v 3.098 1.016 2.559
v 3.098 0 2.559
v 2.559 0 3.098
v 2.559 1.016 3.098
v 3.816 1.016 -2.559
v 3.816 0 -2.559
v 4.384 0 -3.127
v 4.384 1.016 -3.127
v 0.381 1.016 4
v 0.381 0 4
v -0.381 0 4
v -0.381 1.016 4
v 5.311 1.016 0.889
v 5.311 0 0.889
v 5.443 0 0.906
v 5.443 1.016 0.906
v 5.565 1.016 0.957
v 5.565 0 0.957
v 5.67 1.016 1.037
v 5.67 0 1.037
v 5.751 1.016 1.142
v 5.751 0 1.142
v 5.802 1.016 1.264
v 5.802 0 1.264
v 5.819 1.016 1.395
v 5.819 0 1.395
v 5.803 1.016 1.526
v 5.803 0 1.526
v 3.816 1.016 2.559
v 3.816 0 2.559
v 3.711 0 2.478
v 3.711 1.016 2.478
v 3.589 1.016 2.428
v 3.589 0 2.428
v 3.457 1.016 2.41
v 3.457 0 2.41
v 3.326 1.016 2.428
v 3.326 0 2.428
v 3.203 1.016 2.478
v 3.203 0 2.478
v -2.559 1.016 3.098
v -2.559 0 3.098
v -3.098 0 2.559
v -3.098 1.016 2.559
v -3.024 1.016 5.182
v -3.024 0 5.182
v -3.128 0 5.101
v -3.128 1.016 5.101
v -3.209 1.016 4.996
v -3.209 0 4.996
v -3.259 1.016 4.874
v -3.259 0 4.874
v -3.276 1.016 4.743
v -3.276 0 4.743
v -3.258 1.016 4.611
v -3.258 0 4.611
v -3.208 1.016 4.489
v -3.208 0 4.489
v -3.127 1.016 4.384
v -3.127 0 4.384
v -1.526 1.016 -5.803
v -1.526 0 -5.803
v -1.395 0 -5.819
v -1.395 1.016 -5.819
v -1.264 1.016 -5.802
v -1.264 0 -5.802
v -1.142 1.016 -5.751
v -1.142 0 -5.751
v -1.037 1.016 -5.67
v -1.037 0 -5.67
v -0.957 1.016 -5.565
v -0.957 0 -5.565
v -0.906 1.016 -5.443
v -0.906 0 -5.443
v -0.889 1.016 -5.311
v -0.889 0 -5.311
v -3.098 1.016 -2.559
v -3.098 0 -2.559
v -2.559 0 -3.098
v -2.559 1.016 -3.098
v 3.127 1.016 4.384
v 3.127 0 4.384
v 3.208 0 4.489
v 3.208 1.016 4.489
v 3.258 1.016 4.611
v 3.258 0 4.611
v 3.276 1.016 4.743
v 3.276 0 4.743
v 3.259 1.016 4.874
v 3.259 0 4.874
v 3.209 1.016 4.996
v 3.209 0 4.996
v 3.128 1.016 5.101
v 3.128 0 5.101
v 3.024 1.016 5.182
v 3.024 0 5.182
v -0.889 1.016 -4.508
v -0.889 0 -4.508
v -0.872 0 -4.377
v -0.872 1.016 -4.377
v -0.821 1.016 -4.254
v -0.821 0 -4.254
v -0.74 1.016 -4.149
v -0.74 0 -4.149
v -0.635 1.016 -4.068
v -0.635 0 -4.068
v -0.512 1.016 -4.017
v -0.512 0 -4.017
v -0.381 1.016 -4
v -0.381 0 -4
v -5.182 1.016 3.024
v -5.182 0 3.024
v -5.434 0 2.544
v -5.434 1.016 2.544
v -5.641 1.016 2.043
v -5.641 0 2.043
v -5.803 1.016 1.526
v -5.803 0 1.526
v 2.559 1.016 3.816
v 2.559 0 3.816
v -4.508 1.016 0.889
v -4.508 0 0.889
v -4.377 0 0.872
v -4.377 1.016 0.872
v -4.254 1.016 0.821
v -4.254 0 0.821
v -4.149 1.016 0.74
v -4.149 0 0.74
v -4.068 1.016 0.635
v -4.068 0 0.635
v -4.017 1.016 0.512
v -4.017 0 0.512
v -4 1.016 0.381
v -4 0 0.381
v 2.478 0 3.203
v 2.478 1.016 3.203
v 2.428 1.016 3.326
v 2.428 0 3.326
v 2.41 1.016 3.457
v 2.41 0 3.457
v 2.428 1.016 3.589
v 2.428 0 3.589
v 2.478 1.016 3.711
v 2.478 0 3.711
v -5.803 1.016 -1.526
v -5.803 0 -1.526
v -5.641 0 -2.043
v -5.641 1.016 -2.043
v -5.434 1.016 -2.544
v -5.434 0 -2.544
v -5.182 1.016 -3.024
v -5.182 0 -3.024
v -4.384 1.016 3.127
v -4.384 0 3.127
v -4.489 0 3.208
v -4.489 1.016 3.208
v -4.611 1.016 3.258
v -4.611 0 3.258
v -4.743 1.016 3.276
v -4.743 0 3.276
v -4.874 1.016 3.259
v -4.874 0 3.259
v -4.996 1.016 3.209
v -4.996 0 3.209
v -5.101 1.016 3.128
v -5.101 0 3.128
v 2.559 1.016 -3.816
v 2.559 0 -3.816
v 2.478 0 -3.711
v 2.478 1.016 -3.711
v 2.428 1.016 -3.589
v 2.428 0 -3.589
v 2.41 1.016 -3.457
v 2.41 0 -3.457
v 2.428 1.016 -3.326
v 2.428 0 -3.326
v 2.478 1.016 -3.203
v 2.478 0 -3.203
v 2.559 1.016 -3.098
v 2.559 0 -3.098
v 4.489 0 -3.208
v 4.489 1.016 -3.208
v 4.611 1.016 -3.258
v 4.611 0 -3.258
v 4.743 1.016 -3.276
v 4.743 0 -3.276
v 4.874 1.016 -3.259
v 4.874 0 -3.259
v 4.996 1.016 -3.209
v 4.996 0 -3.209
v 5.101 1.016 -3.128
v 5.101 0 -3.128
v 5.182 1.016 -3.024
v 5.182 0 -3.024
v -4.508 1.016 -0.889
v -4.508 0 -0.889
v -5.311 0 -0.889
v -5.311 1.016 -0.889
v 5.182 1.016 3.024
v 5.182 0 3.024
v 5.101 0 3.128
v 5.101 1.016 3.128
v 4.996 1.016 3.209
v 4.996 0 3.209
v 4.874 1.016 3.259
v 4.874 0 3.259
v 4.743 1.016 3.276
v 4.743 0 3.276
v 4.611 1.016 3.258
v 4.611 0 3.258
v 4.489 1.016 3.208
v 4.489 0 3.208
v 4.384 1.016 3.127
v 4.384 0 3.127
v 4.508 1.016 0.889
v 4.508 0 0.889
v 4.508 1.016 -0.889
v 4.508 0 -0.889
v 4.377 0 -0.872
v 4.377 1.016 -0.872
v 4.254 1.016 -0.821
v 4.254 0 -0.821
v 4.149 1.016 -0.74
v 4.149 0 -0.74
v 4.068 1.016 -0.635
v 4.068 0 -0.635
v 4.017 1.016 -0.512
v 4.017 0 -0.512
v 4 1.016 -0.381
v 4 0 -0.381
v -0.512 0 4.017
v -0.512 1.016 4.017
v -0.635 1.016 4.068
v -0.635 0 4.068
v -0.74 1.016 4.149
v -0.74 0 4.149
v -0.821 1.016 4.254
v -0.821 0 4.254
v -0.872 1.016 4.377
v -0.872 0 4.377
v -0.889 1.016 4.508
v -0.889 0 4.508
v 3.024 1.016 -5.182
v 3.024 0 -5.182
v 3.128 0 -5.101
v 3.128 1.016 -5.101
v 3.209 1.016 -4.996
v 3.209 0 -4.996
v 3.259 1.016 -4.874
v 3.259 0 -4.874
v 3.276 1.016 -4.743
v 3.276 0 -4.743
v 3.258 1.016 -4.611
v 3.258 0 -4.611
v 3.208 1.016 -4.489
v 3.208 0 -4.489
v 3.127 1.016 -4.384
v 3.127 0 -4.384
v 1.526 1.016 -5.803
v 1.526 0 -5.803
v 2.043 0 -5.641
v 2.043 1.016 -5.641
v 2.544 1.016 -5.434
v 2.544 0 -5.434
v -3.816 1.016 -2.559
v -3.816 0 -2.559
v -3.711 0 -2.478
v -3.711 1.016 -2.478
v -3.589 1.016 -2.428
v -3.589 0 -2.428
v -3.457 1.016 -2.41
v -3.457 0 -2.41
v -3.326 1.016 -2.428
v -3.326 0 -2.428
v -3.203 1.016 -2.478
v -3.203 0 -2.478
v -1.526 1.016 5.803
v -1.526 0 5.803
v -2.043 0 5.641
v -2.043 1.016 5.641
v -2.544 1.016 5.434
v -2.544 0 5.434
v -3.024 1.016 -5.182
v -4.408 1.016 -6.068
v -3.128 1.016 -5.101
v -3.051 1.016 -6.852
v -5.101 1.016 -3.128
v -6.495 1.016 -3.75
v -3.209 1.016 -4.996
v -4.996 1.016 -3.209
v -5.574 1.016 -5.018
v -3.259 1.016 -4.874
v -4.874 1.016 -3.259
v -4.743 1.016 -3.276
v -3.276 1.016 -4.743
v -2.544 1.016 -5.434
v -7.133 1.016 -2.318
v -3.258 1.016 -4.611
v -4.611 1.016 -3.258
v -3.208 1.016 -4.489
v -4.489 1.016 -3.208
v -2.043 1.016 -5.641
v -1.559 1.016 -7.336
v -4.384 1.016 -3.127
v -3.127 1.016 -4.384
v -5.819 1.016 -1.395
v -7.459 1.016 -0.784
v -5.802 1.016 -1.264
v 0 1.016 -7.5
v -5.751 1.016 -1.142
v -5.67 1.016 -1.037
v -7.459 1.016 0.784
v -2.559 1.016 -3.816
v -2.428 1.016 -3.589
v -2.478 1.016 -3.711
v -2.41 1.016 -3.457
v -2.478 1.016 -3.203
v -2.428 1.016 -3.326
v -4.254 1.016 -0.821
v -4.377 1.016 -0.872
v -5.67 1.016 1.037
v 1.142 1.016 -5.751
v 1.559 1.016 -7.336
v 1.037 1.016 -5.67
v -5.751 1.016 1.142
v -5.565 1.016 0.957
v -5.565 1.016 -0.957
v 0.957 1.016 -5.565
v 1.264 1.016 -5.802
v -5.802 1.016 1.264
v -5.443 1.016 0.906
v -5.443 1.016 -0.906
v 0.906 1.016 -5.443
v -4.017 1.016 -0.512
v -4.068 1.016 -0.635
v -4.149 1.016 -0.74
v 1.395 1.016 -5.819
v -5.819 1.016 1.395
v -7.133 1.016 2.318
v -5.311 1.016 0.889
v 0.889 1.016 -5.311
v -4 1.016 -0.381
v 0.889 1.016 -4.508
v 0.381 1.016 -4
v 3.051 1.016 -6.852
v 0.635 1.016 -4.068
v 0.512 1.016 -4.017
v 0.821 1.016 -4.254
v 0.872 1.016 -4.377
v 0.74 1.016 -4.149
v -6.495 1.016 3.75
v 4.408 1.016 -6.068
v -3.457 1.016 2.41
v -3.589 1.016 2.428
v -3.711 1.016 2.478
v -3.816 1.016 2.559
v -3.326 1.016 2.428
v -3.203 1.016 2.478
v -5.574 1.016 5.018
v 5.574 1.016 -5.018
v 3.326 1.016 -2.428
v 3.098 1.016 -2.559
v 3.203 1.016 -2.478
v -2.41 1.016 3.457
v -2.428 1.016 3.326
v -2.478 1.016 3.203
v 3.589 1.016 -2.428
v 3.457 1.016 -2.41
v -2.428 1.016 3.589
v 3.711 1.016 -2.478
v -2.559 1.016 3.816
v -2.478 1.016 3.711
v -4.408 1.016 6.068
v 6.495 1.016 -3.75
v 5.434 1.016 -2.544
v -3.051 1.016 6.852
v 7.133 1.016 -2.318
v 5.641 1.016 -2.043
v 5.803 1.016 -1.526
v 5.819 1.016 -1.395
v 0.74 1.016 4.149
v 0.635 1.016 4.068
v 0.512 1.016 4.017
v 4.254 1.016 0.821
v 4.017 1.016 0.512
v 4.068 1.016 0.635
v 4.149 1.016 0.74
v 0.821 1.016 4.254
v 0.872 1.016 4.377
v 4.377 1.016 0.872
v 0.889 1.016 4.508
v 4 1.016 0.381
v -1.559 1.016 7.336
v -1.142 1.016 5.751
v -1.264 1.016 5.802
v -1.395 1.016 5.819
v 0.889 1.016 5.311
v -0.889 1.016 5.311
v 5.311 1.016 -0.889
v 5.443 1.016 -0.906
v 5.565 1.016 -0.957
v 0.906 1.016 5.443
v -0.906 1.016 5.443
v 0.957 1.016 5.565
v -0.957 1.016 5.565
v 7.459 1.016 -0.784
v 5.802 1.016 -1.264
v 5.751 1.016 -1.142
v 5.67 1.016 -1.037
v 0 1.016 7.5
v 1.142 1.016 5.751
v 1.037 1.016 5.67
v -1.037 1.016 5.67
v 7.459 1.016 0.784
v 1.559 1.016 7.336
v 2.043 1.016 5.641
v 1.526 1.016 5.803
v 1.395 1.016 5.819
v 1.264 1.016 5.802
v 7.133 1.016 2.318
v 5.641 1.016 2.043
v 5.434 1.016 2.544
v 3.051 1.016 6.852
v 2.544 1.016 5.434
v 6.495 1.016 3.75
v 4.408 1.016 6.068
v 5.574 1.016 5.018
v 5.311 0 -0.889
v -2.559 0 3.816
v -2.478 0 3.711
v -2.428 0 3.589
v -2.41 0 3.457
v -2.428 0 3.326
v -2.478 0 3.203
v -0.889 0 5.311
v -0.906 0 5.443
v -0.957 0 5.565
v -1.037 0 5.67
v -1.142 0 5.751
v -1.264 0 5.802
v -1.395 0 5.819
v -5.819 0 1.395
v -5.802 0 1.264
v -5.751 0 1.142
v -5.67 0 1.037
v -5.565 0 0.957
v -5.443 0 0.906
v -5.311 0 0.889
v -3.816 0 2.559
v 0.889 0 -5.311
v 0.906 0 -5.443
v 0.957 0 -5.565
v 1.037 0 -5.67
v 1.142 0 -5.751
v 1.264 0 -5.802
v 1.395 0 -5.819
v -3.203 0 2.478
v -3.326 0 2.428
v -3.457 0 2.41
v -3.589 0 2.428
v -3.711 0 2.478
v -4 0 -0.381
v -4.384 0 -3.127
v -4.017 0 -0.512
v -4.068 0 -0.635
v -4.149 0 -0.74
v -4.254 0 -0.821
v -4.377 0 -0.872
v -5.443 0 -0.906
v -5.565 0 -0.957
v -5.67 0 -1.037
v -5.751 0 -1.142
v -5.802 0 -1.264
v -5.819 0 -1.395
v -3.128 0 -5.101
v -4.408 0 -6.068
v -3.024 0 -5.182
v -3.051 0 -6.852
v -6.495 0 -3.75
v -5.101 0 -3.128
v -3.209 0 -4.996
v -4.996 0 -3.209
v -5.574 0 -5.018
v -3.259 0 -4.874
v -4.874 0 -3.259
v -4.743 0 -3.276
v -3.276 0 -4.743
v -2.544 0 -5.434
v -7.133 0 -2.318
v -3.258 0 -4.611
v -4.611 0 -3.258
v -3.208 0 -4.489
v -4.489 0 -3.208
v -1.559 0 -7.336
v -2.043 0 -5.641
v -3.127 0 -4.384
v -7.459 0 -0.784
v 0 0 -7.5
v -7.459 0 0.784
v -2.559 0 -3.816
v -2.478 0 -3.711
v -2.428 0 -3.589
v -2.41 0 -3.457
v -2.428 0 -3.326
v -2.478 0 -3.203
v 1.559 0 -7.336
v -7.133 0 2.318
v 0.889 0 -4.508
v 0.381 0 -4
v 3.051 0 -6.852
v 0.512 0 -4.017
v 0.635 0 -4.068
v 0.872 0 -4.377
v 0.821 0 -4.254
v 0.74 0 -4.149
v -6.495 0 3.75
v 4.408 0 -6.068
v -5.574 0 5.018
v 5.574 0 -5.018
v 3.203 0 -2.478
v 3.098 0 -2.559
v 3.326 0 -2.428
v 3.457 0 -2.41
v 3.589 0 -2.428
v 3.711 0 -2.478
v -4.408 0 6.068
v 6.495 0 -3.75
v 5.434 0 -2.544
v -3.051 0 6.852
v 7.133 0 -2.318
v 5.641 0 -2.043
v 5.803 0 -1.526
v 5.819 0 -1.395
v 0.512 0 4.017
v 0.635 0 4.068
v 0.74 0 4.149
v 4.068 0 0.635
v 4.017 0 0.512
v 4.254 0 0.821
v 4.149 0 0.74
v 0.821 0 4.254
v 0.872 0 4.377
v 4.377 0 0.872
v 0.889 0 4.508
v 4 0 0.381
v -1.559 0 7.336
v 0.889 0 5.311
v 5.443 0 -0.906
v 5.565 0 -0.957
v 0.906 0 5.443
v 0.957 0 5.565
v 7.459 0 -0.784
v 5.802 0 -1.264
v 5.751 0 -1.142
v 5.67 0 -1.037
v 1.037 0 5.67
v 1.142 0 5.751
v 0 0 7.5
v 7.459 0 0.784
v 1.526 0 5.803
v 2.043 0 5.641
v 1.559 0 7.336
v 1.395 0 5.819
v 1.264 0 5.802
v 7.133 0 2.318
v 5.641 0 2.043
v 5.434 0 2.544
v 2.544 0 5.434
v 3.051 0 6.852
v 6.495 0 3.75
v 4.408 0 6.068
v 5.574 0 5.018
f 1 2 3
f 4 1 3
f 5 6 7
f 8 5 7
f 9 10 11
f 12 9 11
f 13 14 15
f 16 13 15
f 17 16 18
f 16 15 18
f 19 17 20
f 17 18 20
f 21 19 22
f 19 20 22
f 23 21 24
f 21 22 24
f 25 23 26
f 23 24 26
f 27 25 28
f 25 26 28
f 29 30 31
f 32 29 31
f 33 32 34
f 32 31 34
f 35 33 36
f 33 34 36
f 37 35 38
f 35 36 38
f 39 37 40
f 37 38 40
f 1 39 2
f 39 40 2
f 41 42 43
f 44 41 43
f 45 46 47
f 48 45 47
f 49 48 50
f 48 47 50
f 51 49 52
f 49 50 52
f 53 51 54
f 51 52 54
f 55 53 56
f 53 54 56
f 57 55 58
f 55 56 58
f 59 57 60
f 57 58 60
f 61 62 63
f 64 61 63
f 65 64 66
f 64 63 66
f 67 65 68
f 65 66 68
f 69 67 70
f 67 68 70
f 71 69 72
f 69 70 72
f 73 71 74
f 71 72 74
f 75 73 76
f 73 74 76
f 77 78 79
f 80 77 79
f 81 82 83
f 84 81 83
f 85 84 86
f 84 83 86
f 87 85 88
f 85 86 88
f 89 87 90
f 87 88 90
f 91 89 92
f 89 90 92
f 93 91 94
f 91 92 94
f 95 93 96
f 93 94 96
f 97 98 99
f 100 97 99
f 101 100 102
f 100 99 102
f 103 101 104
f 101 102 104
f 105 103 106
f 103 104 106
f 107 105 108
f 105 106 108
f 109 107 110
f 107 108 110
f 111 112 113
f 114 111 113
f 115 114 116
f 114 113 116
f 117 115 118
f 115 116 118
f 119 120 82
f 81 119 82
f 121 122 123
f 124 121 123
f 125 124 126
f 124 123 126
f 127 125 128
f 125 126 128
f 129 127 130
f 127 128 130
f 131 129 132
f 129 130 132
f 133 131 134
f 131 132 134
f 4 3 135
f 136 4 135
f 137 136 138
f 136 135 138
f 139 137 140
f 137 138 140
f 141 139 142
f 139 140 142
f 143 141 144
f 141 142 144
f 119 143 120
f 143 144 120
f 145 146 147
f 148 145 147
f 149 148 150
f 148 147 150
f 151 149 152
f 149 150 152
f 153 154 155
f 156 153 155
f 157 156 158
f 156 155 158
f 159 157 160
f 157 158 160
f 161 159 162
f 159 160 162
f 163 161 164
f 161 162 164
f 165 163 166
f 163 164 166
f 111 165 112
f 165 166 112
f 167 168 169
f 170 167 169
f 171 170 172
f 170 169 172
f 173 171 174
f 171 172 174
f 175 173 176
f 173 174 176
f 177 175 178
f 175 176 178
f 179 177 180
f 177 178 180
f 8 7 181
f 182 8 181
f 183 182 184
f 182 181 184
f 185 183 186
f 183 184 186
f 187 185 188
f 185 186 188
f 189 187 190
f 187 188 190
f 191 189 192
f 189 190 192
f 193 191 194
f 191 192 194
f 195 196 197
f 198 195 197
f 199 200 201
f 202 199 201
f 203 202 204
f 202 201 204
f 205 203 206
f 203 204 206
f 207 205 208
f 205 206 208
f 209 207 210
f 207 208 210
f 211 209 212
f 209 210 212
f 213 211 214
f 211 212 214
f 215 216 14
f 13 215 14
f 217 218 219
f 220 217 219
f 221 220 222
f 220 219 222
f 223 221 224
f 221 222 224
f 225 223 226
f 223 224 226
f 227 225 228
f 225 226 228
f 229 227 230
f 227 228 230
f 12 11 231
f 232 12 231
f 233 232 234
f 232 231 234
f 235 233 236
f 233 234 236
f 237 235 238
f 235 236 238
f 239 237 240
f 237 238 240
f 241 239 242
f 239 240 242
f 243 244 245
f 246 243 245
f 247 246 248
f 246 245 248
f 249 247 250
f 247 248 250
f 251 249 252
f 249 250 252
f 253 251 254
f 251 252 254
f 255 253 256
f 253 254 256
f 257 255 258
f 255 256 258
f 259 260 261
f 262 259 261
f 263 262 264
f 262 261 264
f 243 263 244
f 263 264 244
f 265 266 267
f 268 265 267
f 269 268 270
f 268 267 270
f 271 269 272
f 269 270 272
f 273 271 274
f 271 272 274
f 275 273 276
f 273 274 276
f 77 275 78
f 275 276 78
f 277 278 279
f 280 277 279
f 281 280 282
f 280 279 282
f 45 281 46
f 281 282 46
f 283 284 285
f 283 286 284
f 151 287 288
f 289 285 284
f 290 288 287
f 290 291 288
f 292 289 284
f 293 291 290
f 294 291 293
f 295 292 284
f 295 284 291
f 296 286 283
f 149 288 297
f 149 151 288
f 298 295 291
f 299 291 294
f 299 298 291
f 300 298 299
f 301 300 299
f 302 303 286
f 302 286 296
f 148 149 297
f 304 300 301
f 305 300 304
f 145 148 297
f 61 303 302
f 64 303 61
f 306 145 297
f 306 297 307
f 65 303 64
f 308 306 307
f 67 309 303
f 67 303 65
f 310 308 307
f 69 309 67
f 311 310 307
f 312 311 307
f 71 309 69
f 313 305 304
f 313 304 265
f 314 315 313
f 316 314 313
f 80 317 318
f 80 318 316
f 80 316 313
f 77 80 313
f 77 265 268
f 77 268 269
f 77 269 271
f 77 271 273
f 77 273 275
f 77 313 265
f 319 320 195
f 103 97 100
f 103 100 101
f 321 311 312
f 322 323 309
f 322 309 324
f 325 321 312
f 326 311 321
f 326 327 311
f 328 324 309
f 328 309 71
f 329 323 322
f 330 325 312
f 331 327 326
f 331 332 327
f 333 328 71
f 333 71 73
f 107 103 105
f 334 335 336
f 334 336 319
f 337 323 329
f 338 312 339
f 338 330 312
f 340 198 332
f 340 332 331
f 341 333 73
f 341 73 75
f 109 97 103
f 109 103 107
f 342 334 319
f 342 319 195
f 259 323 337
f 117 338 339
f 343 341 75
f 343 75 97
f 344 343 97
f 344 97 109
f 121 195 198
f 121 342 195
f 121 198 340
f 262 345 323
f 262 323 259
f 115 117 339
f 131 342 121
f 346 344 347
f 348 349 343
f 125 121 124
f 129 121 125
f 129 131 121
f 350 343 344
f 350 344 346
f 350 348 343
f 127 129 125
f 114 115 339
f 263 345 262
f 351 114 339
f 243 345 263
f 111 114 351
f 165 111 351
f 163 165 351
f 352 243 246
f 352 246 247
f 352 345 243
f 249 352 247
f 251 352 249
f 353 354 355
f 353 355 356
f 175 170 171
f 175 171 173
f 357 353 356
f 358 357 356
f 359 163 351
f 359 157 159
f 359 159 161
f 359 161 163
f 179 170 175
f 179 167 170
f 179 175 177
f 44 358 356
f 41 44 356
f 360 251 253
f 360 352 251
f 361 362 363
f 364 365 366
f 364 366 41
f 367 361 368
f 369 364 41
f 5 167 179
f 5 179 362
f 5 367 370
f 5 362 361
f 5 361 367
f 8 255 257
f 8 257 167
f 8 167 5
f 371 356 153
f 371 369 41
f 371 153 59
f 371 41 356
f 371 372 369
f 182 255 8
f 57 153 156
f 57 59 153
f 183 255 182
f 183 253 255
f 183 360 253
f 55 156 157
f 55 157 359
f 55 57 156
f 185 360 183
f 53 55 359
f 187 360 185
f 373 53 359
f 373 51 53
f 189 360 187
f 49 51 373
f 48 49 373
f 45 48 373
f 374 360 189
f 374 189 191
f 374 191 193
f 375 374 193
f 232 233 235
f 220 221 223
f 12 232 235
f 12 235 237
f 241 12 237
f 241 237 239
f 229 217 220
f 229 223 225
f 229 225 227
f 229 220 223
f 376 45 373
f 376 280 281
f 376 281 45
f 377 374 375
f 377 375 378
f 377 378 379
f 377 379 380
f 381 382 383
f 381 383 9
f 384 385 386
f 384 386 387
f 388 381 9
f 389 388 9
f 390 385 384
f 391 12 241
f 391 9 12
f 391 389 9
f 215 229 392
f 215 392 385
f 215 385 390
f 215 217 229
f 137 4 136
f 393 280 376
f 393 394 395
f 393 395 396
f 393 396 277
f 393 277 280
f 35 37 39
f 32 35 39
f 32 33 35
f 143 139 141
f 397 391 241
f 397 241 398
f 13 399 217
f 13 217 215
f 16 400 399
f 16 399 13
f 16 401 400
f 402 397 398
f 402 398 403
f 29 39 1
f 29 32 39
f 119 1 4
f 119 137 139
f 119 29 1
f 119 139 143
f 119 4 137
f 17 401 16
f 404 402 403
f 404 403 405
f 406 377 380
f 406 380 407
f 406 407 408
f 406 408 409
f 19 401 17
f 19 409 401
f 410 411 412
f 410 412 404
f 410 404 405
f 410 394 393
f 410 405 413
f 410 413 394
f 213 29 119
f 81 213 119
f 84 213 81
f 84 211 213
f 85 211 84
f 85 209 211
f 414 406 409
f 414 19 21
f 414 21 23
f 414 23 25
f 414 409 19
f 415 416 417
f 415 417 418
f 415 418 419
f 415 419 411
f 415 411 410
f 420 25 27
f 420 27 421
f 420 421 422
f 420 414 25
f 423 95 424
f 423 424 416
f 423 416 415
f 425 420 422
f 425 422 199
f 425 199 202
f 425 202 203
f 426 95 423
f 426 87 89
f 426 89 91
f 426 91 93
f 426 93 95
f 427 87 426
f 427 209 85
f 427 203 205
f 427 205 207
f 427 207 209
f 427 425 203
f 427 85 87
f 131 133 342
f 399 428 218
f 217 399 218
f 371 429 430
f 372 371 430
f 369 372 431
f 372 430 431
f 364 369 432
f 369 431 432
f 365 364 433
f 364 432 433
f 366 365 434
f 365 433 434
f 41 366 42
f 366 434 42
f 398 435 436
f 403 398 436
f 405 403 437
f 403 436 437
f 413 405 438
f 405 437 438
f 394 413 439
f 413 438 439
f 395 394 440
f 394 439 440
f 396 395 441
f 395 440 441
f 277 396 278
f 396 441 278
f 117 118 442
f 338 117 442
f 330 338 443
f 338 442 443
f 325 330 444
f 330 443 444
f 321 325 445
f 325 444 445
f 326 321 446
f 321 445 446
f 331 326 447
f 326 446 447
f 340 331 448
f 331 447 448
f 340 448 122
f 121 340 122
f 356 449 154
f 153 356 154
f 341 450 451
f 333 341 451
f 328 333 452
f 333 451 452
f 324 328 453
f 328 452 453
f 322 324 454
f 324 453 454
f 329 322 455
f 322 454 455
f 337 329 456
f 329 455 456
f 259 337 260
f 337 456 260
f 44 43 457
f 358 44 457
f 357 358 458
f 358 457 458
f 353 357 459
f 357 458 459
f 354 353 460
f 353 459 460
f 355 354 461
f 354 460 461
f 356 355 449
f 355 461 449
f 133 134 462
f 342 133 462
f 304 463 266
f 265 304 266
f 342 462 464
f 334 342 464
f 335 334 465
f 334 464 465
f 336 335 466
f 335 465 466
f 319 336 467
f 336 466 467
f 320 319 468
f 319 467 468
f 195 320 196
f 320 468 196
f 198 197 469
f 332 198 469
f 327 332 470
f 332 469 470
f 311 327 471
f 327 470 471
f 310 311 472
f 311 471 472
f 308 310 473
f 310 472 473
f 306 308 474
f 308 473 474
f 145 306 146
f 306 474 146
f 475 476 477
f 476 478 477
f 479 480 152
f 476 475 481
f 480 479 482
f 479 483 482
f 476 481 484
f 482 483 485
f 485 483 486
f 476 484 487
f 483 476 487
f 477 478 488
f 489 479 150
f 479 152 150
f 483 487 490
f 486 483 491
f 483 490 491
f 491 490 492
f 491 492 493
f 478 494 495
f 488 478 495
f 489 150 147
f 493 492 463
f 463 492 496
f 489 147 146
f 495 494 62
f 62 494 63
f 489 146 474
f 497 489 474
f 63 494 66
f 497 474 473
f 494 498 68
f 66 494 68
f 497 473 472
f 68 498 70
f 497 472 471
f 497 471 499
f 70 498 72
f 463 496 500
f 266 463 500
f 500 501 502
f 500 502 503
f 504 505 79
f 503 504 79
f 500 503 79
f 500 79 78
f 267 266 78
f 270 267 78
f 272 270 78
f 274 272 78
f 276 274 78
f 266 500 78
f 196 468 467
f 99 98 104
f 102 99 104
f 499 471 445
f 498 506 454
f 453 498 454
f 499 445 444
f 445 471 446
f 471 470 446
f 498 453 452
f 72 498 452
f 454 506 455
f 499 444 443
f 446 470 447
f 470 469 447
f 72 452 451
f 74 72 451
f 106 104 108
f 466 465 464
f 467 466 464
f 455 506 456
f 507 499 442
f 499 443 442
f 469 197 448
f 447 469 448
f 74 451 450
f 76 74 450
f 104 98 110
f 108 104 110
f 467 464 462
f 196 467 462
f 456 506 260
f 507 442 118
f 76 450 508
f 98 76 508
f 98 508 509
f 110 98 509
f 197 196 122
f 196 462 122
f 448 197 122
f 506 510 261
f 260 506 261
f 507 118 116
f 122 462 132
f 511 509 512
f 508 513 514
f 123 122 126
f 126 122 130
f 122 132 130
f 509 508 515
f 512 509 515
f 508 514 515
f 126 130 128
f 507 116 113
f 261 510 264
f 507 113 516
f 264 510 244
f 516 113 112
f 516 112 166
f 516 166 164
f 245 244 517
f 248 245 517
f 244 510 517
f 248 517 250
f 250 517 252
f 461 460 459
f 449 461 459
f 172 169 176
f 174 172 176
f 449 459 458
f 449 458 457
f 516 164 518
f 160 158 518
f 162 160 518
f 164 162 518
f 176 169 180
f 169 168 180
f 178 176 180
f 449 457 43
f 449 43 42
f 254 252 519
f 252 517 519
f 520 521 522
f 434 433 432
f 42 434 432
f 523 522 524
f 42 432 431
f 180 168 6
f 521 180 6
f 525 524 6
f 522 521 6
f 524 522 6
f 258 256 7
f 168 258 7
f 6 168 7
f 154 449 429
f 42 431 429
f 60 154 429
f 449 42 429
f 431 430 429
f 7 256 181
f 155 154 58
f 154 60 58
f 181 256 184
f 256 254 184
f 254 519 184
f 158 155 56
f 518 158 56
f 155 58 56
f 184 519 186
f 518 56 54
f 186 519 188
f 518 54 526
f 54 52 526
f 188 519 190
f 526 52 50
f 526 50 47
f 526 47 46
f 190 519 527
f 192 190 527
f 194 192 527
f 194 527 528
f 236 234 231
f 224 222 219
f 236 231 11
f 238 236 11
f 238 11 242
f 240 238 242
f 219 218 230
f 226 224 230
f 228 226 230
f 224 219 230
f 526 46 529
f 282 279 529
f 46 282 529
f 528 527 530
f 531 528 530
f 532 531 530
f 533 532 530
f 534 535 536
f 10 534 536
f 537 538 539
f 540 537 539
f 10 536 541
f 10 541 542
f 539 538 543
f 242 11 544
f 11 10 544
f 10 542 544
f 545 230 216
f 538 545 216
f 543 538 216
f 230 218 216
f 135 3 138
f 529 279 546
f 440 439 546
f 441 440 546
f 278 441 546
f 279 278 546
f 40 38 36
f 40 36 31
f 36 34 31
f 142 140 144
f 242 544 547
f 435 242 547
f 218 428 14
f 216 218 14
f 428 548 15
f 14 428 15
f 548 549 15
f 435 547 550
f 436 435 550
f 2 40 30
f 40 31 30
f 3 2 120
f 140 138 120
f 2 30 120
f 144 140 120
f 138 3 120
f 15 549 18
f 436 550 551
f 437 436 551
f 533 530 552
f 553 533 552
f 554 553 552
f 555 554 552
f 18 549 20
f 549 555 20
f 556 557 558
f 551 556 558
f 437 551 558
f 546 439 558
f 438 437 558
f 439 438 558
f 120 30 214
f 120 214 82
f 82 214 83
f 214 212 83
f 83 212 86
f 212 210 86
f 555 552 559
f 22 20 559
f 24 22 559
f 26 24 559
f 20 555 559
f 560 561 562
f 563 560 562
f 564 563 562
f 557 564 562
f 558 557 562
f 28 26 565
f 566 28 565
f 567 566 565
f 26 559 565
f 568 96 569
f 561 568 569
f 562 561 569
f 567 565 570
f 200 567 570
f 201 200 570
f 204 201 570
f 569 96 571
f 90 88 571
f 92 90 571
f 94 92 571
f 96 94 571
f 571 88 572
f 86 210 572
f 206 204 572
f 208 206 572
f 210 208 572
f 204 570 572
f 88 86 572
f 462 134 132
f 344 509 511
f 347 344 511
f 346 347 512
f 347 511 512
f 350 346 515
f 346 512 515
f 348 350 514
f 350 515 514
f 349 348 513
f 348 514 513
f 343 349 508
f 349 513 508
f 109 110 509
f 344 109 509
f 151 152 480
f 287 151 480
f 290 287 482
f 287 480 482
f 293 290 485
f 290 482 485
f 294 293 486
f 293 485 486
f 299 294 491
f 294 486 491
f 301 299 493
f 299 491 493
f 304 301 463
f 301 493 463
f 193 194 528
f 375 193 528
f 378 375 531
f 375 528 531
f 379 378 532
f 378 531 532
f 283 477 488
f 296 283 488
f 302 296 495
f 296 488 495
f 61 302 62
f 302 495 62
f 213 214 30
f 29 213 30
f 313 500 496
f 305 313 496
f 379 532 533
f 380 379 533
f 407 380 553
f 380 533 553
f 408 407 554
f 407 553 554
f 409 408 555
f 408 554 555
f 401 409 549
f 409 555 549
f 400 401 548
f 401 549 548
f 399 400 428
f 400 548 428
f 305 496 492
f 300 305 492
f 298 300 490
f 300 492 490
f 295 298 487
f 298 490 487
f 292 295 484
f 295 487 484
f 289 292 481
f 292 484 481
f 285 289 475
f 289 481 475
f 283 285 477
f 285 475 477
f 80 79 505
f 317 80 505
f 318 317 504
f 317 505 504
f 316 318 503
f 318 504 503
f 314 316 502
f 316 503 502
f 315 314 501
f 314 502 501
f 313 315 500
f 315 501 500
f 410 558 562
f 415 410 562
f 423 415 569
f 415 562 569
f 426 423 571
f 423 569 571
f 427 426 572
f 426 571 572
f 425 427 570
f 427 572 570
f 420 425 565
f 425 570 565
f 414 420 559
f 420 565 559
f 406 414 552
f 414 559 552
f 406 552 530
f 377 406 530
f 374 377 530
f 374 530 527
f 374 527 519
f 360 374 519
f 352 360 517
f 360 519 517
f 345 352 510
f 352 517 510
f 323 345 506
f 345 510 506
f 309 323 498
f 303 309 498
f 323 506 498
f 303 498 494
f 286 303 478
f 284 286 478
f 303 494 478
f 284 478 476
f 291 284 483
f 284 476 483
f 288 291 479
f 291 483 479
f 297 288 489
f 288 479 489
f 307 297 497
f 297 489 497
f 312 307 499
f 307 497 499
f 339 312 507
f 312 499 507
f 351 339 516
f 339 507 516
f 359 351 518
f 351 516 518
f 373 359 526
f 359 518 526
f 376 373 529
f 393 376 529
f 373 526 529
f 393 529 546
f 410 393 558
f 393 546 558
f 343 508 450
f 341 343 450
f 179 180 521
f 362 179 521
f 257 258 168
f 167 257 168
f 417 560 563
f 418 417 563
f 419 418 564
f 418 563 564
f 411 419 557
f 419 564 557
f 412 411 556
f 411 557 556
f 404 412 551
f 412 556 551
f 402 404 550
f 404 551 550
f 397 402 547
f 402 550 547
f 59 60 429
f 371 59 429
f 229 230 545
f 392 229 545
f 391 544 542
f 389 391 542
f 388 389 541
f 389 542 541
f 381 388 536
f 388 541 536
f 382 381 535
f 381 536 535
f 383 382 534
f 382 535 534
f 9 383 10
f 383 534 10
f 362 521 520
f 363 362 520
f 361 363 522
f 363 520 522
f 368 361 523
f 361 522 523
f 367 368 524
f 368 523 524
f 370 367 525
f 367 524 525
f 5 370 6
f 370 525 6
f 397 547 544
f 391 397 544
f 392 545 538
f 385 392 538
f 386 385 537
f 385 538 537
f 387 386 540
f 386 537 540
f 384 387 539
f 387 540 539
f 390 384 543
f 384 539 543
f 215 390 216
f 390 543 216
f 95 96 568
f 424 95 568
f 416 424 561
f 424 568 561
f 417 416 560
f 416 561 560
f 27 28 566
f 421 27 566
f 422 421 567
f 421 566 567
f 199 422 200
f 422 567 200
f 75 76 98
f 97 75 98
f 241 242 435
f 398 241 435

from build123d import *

# Parameters (mm, degrees)
SKETCH1_R           = 7.5
BOSS_EXTRUDE1_DEPTH = 1.016


with BuildPart() as part:
    # Sketch1 → Boss-Extrude1 (new body)
    with BuildSketch(Plane(origin=(0, 0, 0), x_dir=(1, 0, 0), z_dir=(0, 1, 0))):
        with Locations(Location((0, 0, 0), (0, 0, 270))):
            Circle(SKETCH1_R)
        with BuildLine():
            Line((-0.889, 5.311351523), (-0.889, 4.508))
            ThreePointArc((-0.889, 4.508), (-0.740210245, 4.148789755), (-0.381, 4))
            Line((-0.381, 4), (0.381, 4))
            ThreePointArc((0.381, 4), (0.740210245, 4.148789755), (0.889, 4.508))
            Line((0.889, 4.508), (0.889, 5.311351523))
            ThreePointArc((0.889, 5.311351523), (1.08682242, 5.713662185), (1.526219956, 5.802641868))
            ThreePointArc((1.526219956, 5.802641868), (2.296100594, 5.543277195), (3.023886933, 5.182287894))
            ThreePointArc((3.023886933, 5.182287894), (3.271669773, 4.80866878), (3.127074751, 4.384310608))
            Line((3.127074751, 4.384310608), (2.559019441, 3.816255298))
            ThreePointArc((2.559019441, 3.816255298), (2.410229686, 3.457045053), (2.559019441, 3.097834808))
            Line((2.559019441, 3.097834808), (3.097834808, 2.559019441))
            ThreePointArc((3.097834808, 2.559019441), (3.457045053, 2.410229686), (3.816255298, 2.559019441))
            Line((3.816255298, 2.559019441), (4.384310608, 3.127074751))
            ThreePointArc((4.384310608, 3.127074751), (4.80866878, 3.271669773), (5.182287894, 3.023886933))
            ThreePointArc((5.182287894, 3.023886933), (5.543277195, 2.296100594), (5.802641868, 1.526219956))
            ThreePointArc((5.802641868, 1.526219956), (5.713662185, 1.08682242), (5.311351523, 0.889))
            Line((5.311351523, 0.889), (4.508, 0.889))
            ThreePointArc((4.508, 0.889), (4.148789755, 0.740210245), (4, 0.381))
            Line((4, 0.381), (4, -0.381))
            ThreePointArc((4, -0.381), (4.148789755, -0.740210245), (4.508, -0.889))
            Line((4.508, -0.889), (5.311351523, -0.889))
            ThreePointArc((5.311351523, -0.889), (5.713662185, -1.08682242), (5.802641868, -1.526219956))
            ThreePointArc((5.802641868, -1.526219956), (5.543277195, -2.296100594), (5.182287894, -3.023886933))
            ThreePointArc((5.182287894, -3.023886933), (4.80866878, -3.271669773), (4.384310608, -3.127074751))
            Line((4.384310608, -3.127074751), (3.816255298, -2.559019441))
            ThreePointArc((3.816255298, -2.559019441), (3.457045053, -2.410229686), (3.097834808, -2.559019441))
            Line((3.097834808, -2.559019441), (2.559019441, -3.097834808))
            ThreePointArc((2.559019441, -3.097834808), (2.410229686, -3.457045053), (2.559019441, -3.816255298))
            Line((2.559019441, -3.816255298), (3.127074751, -4.384310608))
            ThreePointArc((3.127074751, -4.384310608), (3.271669773, -4.80866878), (3.023886933, -5.182287894))
            ThreePointArc((3.023886933, -5.182287894), (2.296100594, -5.543277195), (1.526219956, -5.802641868))
            ThreePointArc((1.526219956, -5.802641868), (1.08682242, -5.713662185), (0.889, -5.311351523))
            Line((0.889, -5.311351523), (0.889, -4.508))
            ThreePointArc((0.889, -4.508), (0.740210245, -4.148789755), (0.381, -4))
            Line((0.381, -4), (-0.381, -4))
            ThreePointArc((-0.381, -4), (-0.740210245, -4.148789755), (-0.889, -4.508))
            Line((-0.889, -4.508), (-0.889, -5.311351523))
            ThreePointArc((-0.889, -5.311351523), (-1.08682242, -5.713662185), (-1.526219956, -5.802641868))
            ThreePointArc((-1.526219956, -5.802641868), (-2.296100594, -5.543277195), (-3.023886933, -5.182287894))
            ThreePointArc((-3.023886933, -5.182287894), (-3.271669773, -4.80866878), (-3.127074751, -4.384310608))
            Line((-3.127074751, -4.384310608), (-2.559019441, -3.816255298))
            ThreePointArc((-2.559019441, -3.816255298), (-2.410229686, -3.457045053), (-2.559019441, -3.097834808))
            Line((-2.559019441, -3.097834808), (-3.097834808, -2.559019441))
            ThreePointArc((-3.097834808, -2.559019441), (-3.457045053, -2.410229686), (-3.816255298, -2.559019441))
            Line((-3.816255298, -2.559019441), (-4.384310608, -3.127074751))
            ThreePointArc((-4.384310608, -3.127074751), (-4.80866878, -3.271669773), (-5.182287894, -3.023886933))
            ThreePointArc((-5.182287894, -3.023886933), (-5.543277195, -2.296100594), (-5.802641868, -1.526219956))
            ThreePointArc((-5.802641868, -1.526219956), (-5.713662185, -1.08682242), (-5.311351523, -0.889))
            Line((-5.311351523, -0.889), (-4.508, -0.889))
            ThreePointArc((-4.508, -0.889), (-4.148789755, -0.740210245), (-4, -0.381))
            Line((-4, -0.381), (-4, 0.381))
            ThreePointArc((-4, 0.381), (-4.148789755, 0.740210245), (-4.508, 0.889))
            Line((-4.508, 0.889), (-5.311351523, 0.889))
            ThreePointArc((-5.311351523, 0.889), (-5.713662185, 1.08682242), (-5.802641868, 1.526219956))
            ThreePointArc((-5.802641868, 1.526219956), (-5.543277195, 2.296100594), (-5.182287894, 3.023886933))
            ThreePointArc((-5.182287894, 3.023886933), (-4.80866878, 3.271669773), (-4.384310608, 3.127074751))
            Line((-4.384310608, 3.127074751), (-3.816255298, 2.559019441))
            ThreePointArc((-3.816255298, 2.559019441), (-3.457045053, 2.410229686), (-3.097834808, 2.559019441))
            Line((-3.097834808, 2.559019441), (-2.559019441, 3.097834808))
            ThreePointArc((-2.559019441, 3.097834808), (-2.410229686, 3.457045053), (-2.559019441, 3.816255298))
            Line((-2.559019441, 3.816255298), (-3.127074751, 4.384310608))
            ThreePointArc((-3.127074751, 4.384310608), (-3.271669773, 4.80866878), (-3.023886933, 5.182287894))
            ThreePointArc((-3.023886933, 5.182287894), (-2.296100594, 5.543277195), (-1.526219956, 5.802641868))
            ThreePointArc((-1.526219956, 5.802641868), (-1.08682242, 5.713662185), (-0.889, 5.311351523))
        make_face(mode=Mode.SUBTRACT)
    extrude(amount=BOSS_EXTRUDE1_DEPTH)


solid = part.part
